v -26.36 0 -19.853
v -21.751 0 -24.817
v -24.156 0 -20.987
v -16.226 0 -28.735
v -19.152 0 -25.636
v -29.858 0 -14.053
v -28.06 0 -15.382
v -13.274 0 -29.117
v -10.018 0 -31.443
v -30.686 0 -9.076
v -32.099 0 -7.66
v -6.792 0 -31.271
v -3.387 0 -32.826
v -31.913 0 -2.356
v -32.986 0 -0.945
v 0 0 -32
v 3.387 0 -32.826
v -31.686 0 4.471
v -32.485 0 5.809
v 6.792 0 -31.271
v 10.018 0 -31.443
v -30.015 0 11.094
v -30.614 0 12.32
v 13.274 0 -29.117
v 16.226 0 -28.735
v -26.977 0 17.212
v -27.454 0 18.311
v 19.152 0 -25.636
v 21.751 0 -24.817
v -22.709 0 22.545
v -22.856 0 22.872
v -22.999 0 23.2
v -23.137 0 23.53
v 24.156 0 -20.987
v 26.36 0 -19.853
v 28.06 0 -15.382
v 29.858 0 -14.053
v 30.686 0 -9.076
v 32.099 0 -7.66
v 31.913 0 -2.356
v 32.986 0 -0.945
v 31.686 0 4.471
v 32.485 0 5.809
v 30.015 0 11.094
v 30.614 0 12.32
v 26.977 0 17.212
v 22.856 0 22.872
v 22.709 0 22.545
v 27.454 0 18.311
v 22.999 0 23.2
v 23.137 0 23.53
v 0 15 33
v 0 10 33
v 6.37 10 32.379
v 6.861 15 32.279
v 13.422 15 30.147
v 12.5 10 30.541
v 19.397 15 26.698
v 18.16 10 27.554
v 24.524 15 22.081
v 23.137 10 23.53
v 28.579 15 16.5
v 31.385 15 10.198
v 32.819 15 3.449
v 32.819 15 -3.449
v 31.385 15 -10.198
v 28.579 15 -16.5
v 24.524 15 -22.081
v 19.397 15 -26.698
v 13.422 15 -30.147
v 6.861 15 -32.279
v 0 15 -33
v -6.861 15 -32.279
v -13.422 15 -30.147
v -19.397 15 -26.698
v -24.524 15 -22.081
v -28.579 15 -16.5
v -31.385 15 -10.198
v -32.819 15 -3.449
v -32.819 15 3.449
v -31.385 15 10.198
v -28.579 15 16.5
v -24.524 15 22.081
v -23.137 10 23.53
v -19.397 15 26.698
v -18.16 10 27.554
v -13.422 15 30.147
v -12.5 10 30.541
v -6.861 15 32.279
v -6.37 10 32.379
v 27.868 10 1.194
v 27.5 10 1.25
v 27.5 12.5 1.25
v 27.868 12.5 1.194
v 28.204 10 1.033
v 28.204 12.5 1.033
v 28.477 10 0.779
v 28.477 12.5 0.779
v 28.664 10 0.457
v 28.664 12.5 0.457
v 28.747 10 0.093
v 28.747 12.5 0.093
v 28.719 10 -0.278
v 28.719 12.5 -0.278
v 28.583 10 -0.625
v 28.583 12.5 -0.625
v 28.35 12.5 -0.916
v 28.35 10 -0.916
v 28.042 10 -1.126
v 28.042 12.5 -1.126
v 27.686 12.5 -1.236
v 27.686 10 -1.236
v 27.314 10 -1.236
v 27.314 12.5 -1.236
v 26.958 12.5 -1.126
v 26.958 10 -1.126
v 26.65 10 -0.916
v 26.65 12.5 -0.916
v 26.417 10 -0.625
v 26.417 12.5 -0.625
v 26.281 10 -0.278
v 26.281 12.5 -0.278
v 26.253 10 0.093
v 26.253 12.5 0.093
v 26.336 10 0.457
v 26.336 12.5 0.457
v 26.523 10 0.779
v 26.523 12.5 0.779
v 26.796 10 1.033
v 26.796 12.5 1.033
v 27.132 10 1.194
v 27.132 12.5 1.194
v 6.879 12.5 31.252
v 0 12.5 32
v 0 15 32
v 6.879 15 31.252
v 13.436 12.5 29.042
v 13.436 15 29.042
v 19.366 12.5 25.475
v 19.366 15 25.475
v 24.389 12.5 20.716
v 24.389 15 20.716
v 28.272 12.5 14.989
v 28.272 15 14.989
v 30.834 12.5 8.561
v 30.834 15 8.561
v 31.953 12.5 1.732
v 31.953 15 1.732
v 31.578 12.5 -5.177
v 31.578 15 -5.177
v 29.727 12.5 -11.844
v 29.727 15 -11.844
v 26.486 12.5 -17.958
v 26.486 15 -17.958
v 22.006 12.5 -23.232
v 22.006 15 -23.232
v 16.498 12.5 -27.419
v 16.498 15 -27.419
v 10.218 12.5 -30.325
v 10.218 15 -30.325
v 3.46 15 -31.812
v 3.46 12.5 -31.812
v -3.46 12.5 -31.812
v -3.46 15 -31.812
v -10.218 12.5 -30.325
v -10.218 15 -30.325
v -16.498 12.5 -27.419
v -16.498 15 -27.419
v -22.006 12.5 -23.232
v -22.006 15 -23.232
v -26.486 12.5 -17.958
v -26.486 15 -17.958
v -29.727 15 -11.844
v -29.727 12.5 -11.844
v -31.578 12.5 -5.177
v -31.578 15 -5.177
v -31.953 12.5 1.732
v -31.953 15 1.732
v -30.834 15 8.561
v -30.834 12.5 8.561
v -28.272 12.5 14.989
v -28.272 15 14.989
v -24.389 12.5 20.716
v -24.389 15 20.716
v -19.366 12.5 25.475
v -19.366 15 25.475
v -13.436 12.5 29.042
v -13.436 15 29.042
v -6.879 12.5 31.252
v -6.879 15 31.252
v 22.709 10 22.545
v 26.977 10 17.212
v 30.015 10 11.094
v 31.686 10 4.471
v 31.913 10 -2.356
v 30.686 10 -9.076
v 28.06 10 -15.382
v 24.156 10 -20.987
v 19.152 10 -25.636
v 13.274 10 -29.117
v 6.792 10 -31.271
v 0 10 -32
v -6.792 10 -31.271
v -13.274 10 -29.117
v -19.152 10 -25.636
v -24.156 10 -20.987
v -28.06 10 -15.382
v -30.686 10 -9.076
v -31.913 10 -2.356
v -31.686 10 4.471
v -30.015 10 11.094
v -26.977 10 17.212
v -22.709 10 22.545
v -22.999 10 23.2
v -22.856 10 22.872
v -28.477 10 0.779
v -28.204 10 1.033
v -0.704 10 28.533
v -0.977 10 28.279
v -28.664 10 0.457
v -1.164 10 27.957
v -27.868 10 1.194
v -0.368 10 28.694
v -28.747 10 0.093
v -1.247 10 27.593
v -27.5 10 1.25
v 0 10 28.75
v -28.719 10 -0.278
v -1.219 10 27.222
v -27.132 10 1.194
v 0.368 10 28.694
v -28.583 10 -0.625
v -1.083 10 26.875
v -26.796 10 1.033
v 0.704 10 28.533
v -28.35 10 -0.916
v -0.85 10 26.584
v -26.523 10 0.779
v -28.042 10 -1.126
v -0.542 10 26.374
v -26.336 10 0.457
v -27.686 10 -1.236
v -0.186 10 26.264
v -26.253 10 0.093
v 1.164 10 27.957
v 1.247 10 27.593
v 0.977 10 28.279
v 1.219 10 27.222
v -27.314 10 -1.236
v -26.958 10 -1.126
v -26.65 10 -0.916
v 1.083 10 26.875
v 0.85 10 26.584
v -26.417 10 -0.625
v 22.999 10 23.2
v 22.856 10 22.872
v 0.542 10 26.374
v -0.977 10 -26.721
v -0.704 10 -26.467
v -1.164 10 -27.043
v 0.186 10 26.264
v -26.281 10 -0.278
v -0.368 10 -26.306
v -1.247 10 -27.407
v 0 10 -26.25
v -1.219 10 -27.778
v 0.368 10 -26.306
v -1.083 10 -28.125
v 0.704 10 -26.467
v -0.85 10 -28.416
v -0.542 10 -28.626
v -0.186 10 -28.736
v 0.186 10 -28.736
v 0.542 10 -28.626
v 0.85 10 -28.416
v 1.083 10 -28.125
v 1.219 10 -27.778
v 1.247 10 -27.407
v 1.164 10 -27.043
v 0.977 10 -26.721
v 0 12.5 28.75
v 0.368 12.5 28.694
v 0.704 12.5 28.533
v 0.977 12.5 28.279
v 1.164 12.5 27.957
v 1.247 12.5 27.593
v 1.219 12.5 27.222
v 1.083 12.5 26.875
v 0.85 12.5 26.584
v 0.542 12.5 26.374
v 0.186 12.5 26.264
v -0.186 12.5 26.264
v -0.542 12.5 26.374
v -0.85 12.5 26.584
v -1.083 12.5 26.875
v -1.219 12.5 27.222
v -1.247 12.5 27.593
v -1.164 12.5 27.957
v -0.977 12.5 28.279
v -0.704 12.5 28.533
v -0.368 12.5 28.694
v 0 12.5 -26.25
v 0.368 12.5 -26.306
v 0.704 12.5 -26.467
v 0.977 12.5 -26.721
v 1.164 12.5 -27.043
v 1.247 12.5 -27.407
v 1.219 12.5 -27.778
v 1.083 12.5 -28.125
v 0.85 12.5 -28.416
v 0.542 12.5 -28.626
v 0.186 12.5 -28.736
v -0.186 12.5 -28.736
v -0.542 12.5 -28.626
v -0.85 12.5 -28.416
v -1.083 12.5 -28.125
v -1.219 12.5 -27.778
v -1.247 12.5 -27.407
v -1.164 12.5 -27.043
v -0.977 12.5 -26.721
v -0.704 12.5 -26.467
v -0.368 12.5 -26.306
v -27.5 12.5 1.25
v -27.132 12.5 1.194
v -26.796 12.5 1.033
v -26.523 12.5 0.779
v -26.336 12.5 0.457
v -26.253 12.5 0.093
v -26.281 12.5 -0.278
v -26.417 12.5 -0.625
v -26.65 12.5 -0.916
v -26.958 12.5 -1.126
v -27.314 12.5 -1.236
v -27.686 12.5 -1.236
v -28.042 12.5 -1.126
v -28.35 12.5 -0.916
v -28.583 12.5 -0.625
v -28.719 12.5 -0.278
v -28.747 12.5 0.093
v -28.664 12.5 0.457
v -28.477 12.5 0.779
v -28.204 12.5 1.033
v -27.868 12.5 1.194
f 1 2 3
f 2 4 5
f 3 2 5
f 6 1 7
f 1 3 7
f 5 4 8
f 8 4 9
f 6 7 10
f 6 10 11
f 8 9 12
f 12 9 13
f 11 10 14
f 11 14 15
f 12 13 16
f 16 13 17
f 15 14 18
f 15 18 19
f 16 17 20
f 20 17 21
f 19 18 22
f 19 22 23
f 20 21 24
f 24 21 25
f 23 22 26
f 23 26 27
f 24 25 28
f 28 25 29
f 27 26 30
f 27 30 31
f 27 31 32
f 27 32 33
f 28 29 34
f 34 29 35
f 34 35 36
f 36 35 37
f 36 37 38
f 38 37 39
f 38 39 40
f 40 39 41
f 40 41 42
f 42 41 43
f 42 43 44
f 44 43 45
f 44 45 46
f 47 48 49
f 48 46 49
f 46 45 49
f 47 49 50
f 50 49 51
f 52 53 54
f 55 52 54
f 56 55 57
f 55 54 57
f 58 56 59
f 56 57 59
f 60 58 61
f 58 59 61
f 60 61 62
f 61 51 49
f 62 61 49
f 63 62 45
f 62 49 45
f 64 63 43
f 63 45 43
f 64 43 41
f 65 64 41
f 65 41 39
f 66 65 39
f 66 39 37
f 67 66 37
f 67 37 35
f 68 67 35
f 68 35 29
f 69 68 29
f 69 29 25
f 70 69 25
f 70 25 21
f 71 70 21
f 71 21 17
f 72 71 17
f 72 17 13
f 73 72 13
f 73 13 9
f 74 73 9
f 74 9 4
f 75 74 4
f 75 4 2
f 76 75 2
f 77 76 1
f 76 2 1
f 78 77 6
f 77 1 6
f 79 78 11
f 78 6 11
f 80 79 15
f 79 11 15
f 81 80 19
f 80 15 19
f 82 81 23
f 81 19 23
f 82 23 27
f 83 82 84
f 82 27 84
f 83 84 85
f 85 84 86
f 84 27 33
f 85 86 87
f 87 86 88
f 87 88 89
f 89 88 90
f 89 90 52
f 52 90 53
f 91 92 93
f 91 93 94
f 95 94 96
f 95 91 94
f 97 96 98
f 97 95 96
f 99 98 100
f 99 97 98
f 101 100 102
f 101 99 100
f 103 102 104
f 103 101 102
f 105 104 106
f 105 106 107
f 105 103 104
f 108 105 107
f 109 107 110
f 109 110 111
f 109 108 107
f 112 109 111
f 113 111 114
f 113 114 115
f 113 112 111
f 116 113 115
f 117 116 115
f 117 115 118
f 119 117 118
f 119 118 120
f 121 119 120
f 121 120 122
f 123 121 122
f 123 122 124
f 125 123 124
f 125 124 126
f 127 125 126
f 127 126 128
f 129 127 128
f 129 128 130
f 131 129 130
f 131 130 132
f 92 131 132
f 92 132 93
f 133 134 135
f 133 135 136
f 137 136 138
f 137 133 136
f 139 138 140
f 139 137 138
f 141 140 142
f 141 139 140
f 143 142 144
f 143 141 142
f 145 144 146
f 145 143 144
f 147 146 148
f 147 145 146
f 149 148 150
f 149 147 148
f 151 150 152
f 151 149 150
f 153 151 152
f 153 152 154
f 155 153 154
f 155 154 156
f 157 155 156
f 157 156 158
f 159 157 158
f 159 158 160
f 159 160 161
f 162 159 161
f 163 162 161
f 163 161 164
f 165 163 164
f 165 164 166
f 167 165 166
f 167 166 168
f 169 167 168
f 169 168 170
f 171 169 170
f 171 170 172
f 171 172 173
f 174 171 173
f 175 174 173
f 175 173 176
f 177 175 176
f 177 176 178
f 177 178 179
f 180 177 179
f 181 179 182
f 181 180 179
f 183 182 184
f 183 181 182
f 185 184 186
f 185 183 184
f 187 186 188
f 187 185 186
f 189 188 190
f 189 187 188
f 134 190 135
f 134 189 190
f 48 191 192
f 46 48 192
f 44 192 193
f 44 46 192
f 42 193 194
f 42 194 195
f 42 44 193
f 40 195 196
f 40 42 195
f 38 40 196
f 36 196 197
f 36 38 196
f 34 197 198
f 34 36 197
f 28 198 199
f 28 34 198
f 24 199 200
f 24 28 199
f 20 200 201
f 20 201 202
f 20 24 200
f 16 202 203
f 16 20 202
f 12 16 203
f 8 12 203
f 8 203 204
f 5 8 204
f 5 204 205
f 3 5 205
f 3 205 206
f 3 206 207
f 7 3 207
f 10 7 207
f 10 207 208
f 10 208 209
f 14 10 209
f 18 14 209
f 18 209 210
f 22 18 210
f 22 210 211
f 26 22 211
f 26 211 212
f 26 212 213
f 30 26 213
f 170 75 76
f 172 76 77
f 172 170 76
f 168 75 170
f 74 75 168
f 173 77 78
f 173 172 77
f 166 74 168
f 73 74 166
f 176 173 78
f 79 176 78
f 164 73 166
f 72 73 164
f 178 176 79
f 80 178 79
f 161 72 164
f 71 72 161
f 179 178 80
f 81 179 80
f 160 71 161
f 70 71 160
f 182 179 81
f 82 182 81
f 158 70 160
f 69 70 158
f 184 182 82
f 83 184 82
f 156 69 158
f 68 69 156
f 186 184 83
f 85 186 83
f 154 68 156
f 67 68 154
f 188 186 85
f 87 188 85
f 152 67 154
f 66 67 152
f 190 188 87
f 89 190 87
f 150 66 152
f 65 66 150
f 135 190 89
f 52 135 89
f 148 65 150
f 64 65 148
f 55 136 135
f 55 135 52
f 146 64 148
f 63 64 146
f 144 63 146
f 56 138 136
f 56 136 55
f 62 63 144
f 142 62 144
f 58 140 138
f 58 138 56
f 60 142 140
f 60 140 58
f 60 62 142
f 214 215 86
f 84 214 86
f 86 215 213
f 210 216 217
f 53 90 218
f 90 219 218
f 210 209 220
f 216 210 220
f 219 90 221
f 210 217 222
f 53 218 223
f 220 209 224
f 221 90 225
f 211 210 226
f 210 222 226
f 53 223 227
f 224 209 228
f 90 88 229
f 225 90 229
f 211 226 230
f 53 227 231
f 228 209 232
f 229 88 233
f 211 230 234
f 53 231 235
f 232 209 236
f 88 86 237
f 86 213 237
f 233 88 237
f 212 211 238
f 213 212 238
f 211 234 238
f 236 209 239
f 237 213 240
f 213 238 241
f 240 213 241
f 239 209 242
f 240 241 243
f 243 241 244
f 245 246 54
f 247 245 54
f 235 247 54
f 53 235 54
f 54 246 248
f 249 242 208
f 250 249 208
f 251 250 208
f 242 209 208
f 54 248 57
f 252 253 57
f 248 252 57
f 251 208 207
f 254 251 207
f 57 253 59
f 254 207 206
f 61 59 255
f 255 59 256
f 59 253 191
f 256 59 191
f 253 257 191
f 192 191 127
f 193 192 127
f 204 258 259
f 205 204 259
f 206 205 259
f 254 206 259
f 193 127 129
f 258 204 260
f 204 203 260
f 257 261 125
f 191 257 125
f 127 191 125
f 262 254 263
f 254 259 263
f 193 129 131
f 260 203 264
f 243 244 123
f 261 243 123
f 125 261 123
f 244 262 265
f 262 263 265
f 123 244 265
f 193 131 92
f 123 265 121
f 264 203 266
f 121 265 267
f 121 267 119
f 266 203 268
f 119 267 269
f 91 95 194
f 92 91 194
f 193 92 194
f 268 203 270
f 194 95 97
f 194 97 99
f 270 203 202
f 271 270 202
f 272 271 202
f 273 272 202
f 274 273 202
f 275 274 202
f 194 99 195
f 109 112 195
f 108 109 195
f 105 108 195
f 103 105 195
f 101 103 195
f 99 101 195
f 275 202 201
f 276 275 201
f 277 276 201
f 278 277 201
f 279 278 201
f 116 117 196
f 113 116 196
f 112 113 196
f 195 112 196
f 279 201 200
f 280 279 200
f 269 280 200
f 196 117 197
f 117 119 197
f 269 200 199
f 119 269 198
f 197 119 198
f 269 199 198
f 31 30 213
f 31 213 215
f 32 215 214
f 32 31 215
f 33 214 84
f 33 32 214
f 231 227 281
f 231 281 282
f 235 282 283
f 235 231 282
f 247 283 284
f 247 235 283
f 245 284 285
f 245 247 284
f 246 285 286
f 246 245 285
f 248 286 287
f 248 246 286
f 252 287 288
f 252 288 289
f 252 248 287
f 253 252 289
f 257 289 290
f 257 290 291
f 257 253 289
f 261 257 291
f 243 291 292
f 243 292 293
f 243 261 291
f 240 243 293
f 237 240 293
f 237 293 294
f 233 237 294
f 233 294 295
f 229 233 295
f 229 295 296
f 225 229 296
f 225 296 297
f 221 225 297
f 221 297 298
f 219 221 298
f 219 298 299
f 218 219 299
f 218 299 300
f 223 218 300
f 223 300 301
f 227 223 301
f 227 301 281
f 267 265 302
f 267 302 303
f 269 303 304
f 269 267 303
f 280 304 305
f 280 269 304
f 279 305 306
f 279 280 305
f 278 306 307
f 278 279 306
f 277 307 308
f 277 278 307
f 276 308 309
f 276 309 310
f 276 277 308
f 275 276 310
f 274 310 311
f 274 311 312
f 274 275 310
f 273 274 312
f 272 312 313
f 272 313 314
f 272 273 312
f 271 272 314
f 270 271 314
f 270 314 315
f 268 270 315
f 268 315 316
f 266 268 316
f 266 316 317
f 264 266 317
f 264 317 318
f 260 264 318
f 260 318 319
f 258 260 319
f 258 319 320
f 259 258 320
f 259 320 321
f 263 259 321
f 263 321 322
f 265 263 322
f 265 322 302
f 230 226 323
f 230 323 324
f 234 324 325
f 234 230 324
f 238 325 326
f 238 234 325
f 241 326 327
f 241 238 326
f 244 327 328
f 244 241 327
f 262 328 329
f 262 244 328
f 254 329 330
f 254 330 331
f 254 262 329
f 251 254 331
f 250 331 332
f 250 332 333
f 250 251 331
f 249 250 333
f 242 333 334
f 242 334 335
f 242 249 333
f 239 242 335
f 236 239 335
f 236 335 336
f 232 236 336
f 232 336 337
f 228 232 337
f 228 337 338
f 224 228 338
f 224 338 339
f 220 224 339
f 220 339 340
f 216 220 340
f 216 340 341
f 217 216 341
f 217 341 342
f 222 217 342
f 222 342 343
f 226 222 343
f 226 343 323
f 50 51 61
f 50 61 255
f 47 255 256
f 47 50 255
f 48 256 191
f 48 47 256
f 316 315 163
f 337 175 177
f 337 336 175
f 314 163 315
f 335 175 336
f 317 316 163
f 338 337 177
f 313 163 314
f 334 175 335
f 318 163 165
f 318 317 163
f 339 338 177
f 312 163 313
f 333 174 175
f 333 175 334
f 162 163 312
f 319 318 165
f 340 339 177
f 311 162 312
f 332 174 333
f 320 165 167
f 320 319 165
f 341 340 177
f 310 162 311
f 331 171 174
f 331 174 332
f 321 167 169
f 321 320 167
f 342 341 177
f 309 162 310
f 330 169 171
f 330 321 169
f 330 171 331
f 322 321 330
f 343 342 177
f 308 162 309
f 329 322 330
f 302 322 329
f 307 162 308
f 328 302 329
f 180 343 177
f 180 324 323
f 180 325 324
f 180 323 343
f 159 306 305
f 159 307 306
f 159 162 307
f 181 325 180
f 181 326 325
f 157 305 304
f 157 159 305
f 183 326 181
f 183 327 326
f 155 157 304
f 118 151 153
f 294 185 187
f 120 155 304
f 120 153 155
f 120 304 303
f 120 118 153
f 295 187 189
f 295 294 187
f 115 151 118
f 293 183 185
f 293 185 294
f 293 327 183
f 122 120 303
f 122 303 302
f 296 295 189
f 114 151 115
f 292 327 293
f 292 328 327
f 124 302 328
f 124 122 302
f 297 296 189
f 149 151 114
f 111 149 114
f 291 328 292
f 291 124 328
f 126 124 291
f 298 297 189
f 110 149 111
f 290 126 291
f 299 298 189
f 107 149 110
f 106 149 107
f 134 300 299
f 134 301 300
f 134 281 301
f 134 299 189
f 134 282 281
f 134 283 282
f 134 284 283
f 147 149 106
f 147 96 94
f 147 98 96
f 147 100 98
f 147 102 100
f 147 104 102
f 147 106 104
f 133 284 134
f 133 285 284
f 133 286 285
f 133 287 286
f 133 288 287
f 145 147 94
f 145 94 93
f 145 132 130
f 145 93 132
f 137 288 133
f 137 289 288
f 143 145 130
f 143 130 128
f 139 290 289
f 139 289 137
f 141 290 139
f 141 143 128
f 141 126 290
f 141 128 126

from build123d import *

# Parameters (mm, degrees)
SKETCH1_R               = 33
SKETCH1_R_2             = 1.25
BOSS_EXTRUDE1_DEPTH     = 12.5
SKETCH2_R               = 32
CUT_EXTRUDE2_DEPTH      = 10
SKETCH8_R               = 33
SKETCH8_R_2             = 32
BOSS_EXTRUDE2_DEPTH     = 15
CUT_REVOLVE_THIN2_DEPTH = 10


# Read off the part's stored shape, not the designer's step: Cut-Revolve-Thin2
with BuildPart() as part:
    # Sketch1 → Boss-Extrude1 (new body)
    with BuildSketch(Plane(origin=(0, 0, 0), x_dir=(1, 0, 0), z_dir=(0, 1, 0))):
        with Locations(Location((0, 0, 0), (0, 0, 270))):
            Circle(SKETCH1_R)
        with Locations(Location((0, 27.5, 0), (0, 0, 270))):
            Circle(SKETCH1_R_2, mode=Mode.SUBTRACT)
        with Locations(Location((27.5, 0, 0), (0, 0, 270))):
            Circle(SKETCH1_R_2, mode=Mode.SUBTRACT)
        with Locations(Location((0, -27.5, 0), (0, 0, 270))):
            Circle(SKETCH1_R_2, mode=Mode.SUBTRACT)
        with Locations(Location((-27.5, 0, 0), (0, 0, 270))):
            Circle(SKETCH1_R_2, mode=Mode.SUBTRACT)
    extrude(amount=BOSS_EXTRUDE1_DEPTH)

    # Sketch2 → Cut-Extrude2 (cut)
    with BuildSketch(Plane(origin=(0, 0, 0), x_dir=(1, 0, 0), z_dir=(0, 1, 0))):
        with Locations(Location((0, 0, 0), (0, 0, 270))):
            Circle(SKETCH2_R)
    extrude(amount=CUT_EXTRUDE2_DEPTH, mode=Mode.SUBTRACT)

    # Sketch8 → Boss-Extrude2 (add)
    with BuildSketch(Plane(origin=(0, 0, 0), x_dir=(1, 0, 0), z_dir=(0, 1, 0))):
        with Locations(Location((0, 0, 0), (0, 0, 270))):
            Circle(SKETCH8_R)
        with Locations(Location((0, 0, 0), (0, 0, 270))):
            Circle(SKETCH8_R_2, mode=Mode.SUBTRACT)
    extrude(amount=BOSS_EXTRUDE2_DEPTH)

    # Cut-Revolve-Thin2 outline → Cut-Revolve-Thin2 (cut)
    with BuildSketch(Plane(origin=(0, 0, 0), x_dir=(1, 0, 0), z_dir=(0, 1, 0))):
        with BuildLine():
            ThreePointArc((-22.709083631, -22.545454545), (-22.928374212, -23.0355805), (-23.137087961, -23.53030303))
            ThreePointArc((-23.137087961, -23.53030303), (0, -33), (23.137087961, -23.53030303))
            ThreePointArc((23.137087961, -23.53030303), (22.928374212, -23.0355805), (22.709083631, -22.545454545))
            ThreePointArc((22.709083631, -22.545454545), (0, -32), (-22.709083631, -22.545454545))
        make_face()
    extrude(amount=CUT_REVOLVE_THIN2_DEPTH, mode=Mode.SUBTRACT)


solid = part.part
